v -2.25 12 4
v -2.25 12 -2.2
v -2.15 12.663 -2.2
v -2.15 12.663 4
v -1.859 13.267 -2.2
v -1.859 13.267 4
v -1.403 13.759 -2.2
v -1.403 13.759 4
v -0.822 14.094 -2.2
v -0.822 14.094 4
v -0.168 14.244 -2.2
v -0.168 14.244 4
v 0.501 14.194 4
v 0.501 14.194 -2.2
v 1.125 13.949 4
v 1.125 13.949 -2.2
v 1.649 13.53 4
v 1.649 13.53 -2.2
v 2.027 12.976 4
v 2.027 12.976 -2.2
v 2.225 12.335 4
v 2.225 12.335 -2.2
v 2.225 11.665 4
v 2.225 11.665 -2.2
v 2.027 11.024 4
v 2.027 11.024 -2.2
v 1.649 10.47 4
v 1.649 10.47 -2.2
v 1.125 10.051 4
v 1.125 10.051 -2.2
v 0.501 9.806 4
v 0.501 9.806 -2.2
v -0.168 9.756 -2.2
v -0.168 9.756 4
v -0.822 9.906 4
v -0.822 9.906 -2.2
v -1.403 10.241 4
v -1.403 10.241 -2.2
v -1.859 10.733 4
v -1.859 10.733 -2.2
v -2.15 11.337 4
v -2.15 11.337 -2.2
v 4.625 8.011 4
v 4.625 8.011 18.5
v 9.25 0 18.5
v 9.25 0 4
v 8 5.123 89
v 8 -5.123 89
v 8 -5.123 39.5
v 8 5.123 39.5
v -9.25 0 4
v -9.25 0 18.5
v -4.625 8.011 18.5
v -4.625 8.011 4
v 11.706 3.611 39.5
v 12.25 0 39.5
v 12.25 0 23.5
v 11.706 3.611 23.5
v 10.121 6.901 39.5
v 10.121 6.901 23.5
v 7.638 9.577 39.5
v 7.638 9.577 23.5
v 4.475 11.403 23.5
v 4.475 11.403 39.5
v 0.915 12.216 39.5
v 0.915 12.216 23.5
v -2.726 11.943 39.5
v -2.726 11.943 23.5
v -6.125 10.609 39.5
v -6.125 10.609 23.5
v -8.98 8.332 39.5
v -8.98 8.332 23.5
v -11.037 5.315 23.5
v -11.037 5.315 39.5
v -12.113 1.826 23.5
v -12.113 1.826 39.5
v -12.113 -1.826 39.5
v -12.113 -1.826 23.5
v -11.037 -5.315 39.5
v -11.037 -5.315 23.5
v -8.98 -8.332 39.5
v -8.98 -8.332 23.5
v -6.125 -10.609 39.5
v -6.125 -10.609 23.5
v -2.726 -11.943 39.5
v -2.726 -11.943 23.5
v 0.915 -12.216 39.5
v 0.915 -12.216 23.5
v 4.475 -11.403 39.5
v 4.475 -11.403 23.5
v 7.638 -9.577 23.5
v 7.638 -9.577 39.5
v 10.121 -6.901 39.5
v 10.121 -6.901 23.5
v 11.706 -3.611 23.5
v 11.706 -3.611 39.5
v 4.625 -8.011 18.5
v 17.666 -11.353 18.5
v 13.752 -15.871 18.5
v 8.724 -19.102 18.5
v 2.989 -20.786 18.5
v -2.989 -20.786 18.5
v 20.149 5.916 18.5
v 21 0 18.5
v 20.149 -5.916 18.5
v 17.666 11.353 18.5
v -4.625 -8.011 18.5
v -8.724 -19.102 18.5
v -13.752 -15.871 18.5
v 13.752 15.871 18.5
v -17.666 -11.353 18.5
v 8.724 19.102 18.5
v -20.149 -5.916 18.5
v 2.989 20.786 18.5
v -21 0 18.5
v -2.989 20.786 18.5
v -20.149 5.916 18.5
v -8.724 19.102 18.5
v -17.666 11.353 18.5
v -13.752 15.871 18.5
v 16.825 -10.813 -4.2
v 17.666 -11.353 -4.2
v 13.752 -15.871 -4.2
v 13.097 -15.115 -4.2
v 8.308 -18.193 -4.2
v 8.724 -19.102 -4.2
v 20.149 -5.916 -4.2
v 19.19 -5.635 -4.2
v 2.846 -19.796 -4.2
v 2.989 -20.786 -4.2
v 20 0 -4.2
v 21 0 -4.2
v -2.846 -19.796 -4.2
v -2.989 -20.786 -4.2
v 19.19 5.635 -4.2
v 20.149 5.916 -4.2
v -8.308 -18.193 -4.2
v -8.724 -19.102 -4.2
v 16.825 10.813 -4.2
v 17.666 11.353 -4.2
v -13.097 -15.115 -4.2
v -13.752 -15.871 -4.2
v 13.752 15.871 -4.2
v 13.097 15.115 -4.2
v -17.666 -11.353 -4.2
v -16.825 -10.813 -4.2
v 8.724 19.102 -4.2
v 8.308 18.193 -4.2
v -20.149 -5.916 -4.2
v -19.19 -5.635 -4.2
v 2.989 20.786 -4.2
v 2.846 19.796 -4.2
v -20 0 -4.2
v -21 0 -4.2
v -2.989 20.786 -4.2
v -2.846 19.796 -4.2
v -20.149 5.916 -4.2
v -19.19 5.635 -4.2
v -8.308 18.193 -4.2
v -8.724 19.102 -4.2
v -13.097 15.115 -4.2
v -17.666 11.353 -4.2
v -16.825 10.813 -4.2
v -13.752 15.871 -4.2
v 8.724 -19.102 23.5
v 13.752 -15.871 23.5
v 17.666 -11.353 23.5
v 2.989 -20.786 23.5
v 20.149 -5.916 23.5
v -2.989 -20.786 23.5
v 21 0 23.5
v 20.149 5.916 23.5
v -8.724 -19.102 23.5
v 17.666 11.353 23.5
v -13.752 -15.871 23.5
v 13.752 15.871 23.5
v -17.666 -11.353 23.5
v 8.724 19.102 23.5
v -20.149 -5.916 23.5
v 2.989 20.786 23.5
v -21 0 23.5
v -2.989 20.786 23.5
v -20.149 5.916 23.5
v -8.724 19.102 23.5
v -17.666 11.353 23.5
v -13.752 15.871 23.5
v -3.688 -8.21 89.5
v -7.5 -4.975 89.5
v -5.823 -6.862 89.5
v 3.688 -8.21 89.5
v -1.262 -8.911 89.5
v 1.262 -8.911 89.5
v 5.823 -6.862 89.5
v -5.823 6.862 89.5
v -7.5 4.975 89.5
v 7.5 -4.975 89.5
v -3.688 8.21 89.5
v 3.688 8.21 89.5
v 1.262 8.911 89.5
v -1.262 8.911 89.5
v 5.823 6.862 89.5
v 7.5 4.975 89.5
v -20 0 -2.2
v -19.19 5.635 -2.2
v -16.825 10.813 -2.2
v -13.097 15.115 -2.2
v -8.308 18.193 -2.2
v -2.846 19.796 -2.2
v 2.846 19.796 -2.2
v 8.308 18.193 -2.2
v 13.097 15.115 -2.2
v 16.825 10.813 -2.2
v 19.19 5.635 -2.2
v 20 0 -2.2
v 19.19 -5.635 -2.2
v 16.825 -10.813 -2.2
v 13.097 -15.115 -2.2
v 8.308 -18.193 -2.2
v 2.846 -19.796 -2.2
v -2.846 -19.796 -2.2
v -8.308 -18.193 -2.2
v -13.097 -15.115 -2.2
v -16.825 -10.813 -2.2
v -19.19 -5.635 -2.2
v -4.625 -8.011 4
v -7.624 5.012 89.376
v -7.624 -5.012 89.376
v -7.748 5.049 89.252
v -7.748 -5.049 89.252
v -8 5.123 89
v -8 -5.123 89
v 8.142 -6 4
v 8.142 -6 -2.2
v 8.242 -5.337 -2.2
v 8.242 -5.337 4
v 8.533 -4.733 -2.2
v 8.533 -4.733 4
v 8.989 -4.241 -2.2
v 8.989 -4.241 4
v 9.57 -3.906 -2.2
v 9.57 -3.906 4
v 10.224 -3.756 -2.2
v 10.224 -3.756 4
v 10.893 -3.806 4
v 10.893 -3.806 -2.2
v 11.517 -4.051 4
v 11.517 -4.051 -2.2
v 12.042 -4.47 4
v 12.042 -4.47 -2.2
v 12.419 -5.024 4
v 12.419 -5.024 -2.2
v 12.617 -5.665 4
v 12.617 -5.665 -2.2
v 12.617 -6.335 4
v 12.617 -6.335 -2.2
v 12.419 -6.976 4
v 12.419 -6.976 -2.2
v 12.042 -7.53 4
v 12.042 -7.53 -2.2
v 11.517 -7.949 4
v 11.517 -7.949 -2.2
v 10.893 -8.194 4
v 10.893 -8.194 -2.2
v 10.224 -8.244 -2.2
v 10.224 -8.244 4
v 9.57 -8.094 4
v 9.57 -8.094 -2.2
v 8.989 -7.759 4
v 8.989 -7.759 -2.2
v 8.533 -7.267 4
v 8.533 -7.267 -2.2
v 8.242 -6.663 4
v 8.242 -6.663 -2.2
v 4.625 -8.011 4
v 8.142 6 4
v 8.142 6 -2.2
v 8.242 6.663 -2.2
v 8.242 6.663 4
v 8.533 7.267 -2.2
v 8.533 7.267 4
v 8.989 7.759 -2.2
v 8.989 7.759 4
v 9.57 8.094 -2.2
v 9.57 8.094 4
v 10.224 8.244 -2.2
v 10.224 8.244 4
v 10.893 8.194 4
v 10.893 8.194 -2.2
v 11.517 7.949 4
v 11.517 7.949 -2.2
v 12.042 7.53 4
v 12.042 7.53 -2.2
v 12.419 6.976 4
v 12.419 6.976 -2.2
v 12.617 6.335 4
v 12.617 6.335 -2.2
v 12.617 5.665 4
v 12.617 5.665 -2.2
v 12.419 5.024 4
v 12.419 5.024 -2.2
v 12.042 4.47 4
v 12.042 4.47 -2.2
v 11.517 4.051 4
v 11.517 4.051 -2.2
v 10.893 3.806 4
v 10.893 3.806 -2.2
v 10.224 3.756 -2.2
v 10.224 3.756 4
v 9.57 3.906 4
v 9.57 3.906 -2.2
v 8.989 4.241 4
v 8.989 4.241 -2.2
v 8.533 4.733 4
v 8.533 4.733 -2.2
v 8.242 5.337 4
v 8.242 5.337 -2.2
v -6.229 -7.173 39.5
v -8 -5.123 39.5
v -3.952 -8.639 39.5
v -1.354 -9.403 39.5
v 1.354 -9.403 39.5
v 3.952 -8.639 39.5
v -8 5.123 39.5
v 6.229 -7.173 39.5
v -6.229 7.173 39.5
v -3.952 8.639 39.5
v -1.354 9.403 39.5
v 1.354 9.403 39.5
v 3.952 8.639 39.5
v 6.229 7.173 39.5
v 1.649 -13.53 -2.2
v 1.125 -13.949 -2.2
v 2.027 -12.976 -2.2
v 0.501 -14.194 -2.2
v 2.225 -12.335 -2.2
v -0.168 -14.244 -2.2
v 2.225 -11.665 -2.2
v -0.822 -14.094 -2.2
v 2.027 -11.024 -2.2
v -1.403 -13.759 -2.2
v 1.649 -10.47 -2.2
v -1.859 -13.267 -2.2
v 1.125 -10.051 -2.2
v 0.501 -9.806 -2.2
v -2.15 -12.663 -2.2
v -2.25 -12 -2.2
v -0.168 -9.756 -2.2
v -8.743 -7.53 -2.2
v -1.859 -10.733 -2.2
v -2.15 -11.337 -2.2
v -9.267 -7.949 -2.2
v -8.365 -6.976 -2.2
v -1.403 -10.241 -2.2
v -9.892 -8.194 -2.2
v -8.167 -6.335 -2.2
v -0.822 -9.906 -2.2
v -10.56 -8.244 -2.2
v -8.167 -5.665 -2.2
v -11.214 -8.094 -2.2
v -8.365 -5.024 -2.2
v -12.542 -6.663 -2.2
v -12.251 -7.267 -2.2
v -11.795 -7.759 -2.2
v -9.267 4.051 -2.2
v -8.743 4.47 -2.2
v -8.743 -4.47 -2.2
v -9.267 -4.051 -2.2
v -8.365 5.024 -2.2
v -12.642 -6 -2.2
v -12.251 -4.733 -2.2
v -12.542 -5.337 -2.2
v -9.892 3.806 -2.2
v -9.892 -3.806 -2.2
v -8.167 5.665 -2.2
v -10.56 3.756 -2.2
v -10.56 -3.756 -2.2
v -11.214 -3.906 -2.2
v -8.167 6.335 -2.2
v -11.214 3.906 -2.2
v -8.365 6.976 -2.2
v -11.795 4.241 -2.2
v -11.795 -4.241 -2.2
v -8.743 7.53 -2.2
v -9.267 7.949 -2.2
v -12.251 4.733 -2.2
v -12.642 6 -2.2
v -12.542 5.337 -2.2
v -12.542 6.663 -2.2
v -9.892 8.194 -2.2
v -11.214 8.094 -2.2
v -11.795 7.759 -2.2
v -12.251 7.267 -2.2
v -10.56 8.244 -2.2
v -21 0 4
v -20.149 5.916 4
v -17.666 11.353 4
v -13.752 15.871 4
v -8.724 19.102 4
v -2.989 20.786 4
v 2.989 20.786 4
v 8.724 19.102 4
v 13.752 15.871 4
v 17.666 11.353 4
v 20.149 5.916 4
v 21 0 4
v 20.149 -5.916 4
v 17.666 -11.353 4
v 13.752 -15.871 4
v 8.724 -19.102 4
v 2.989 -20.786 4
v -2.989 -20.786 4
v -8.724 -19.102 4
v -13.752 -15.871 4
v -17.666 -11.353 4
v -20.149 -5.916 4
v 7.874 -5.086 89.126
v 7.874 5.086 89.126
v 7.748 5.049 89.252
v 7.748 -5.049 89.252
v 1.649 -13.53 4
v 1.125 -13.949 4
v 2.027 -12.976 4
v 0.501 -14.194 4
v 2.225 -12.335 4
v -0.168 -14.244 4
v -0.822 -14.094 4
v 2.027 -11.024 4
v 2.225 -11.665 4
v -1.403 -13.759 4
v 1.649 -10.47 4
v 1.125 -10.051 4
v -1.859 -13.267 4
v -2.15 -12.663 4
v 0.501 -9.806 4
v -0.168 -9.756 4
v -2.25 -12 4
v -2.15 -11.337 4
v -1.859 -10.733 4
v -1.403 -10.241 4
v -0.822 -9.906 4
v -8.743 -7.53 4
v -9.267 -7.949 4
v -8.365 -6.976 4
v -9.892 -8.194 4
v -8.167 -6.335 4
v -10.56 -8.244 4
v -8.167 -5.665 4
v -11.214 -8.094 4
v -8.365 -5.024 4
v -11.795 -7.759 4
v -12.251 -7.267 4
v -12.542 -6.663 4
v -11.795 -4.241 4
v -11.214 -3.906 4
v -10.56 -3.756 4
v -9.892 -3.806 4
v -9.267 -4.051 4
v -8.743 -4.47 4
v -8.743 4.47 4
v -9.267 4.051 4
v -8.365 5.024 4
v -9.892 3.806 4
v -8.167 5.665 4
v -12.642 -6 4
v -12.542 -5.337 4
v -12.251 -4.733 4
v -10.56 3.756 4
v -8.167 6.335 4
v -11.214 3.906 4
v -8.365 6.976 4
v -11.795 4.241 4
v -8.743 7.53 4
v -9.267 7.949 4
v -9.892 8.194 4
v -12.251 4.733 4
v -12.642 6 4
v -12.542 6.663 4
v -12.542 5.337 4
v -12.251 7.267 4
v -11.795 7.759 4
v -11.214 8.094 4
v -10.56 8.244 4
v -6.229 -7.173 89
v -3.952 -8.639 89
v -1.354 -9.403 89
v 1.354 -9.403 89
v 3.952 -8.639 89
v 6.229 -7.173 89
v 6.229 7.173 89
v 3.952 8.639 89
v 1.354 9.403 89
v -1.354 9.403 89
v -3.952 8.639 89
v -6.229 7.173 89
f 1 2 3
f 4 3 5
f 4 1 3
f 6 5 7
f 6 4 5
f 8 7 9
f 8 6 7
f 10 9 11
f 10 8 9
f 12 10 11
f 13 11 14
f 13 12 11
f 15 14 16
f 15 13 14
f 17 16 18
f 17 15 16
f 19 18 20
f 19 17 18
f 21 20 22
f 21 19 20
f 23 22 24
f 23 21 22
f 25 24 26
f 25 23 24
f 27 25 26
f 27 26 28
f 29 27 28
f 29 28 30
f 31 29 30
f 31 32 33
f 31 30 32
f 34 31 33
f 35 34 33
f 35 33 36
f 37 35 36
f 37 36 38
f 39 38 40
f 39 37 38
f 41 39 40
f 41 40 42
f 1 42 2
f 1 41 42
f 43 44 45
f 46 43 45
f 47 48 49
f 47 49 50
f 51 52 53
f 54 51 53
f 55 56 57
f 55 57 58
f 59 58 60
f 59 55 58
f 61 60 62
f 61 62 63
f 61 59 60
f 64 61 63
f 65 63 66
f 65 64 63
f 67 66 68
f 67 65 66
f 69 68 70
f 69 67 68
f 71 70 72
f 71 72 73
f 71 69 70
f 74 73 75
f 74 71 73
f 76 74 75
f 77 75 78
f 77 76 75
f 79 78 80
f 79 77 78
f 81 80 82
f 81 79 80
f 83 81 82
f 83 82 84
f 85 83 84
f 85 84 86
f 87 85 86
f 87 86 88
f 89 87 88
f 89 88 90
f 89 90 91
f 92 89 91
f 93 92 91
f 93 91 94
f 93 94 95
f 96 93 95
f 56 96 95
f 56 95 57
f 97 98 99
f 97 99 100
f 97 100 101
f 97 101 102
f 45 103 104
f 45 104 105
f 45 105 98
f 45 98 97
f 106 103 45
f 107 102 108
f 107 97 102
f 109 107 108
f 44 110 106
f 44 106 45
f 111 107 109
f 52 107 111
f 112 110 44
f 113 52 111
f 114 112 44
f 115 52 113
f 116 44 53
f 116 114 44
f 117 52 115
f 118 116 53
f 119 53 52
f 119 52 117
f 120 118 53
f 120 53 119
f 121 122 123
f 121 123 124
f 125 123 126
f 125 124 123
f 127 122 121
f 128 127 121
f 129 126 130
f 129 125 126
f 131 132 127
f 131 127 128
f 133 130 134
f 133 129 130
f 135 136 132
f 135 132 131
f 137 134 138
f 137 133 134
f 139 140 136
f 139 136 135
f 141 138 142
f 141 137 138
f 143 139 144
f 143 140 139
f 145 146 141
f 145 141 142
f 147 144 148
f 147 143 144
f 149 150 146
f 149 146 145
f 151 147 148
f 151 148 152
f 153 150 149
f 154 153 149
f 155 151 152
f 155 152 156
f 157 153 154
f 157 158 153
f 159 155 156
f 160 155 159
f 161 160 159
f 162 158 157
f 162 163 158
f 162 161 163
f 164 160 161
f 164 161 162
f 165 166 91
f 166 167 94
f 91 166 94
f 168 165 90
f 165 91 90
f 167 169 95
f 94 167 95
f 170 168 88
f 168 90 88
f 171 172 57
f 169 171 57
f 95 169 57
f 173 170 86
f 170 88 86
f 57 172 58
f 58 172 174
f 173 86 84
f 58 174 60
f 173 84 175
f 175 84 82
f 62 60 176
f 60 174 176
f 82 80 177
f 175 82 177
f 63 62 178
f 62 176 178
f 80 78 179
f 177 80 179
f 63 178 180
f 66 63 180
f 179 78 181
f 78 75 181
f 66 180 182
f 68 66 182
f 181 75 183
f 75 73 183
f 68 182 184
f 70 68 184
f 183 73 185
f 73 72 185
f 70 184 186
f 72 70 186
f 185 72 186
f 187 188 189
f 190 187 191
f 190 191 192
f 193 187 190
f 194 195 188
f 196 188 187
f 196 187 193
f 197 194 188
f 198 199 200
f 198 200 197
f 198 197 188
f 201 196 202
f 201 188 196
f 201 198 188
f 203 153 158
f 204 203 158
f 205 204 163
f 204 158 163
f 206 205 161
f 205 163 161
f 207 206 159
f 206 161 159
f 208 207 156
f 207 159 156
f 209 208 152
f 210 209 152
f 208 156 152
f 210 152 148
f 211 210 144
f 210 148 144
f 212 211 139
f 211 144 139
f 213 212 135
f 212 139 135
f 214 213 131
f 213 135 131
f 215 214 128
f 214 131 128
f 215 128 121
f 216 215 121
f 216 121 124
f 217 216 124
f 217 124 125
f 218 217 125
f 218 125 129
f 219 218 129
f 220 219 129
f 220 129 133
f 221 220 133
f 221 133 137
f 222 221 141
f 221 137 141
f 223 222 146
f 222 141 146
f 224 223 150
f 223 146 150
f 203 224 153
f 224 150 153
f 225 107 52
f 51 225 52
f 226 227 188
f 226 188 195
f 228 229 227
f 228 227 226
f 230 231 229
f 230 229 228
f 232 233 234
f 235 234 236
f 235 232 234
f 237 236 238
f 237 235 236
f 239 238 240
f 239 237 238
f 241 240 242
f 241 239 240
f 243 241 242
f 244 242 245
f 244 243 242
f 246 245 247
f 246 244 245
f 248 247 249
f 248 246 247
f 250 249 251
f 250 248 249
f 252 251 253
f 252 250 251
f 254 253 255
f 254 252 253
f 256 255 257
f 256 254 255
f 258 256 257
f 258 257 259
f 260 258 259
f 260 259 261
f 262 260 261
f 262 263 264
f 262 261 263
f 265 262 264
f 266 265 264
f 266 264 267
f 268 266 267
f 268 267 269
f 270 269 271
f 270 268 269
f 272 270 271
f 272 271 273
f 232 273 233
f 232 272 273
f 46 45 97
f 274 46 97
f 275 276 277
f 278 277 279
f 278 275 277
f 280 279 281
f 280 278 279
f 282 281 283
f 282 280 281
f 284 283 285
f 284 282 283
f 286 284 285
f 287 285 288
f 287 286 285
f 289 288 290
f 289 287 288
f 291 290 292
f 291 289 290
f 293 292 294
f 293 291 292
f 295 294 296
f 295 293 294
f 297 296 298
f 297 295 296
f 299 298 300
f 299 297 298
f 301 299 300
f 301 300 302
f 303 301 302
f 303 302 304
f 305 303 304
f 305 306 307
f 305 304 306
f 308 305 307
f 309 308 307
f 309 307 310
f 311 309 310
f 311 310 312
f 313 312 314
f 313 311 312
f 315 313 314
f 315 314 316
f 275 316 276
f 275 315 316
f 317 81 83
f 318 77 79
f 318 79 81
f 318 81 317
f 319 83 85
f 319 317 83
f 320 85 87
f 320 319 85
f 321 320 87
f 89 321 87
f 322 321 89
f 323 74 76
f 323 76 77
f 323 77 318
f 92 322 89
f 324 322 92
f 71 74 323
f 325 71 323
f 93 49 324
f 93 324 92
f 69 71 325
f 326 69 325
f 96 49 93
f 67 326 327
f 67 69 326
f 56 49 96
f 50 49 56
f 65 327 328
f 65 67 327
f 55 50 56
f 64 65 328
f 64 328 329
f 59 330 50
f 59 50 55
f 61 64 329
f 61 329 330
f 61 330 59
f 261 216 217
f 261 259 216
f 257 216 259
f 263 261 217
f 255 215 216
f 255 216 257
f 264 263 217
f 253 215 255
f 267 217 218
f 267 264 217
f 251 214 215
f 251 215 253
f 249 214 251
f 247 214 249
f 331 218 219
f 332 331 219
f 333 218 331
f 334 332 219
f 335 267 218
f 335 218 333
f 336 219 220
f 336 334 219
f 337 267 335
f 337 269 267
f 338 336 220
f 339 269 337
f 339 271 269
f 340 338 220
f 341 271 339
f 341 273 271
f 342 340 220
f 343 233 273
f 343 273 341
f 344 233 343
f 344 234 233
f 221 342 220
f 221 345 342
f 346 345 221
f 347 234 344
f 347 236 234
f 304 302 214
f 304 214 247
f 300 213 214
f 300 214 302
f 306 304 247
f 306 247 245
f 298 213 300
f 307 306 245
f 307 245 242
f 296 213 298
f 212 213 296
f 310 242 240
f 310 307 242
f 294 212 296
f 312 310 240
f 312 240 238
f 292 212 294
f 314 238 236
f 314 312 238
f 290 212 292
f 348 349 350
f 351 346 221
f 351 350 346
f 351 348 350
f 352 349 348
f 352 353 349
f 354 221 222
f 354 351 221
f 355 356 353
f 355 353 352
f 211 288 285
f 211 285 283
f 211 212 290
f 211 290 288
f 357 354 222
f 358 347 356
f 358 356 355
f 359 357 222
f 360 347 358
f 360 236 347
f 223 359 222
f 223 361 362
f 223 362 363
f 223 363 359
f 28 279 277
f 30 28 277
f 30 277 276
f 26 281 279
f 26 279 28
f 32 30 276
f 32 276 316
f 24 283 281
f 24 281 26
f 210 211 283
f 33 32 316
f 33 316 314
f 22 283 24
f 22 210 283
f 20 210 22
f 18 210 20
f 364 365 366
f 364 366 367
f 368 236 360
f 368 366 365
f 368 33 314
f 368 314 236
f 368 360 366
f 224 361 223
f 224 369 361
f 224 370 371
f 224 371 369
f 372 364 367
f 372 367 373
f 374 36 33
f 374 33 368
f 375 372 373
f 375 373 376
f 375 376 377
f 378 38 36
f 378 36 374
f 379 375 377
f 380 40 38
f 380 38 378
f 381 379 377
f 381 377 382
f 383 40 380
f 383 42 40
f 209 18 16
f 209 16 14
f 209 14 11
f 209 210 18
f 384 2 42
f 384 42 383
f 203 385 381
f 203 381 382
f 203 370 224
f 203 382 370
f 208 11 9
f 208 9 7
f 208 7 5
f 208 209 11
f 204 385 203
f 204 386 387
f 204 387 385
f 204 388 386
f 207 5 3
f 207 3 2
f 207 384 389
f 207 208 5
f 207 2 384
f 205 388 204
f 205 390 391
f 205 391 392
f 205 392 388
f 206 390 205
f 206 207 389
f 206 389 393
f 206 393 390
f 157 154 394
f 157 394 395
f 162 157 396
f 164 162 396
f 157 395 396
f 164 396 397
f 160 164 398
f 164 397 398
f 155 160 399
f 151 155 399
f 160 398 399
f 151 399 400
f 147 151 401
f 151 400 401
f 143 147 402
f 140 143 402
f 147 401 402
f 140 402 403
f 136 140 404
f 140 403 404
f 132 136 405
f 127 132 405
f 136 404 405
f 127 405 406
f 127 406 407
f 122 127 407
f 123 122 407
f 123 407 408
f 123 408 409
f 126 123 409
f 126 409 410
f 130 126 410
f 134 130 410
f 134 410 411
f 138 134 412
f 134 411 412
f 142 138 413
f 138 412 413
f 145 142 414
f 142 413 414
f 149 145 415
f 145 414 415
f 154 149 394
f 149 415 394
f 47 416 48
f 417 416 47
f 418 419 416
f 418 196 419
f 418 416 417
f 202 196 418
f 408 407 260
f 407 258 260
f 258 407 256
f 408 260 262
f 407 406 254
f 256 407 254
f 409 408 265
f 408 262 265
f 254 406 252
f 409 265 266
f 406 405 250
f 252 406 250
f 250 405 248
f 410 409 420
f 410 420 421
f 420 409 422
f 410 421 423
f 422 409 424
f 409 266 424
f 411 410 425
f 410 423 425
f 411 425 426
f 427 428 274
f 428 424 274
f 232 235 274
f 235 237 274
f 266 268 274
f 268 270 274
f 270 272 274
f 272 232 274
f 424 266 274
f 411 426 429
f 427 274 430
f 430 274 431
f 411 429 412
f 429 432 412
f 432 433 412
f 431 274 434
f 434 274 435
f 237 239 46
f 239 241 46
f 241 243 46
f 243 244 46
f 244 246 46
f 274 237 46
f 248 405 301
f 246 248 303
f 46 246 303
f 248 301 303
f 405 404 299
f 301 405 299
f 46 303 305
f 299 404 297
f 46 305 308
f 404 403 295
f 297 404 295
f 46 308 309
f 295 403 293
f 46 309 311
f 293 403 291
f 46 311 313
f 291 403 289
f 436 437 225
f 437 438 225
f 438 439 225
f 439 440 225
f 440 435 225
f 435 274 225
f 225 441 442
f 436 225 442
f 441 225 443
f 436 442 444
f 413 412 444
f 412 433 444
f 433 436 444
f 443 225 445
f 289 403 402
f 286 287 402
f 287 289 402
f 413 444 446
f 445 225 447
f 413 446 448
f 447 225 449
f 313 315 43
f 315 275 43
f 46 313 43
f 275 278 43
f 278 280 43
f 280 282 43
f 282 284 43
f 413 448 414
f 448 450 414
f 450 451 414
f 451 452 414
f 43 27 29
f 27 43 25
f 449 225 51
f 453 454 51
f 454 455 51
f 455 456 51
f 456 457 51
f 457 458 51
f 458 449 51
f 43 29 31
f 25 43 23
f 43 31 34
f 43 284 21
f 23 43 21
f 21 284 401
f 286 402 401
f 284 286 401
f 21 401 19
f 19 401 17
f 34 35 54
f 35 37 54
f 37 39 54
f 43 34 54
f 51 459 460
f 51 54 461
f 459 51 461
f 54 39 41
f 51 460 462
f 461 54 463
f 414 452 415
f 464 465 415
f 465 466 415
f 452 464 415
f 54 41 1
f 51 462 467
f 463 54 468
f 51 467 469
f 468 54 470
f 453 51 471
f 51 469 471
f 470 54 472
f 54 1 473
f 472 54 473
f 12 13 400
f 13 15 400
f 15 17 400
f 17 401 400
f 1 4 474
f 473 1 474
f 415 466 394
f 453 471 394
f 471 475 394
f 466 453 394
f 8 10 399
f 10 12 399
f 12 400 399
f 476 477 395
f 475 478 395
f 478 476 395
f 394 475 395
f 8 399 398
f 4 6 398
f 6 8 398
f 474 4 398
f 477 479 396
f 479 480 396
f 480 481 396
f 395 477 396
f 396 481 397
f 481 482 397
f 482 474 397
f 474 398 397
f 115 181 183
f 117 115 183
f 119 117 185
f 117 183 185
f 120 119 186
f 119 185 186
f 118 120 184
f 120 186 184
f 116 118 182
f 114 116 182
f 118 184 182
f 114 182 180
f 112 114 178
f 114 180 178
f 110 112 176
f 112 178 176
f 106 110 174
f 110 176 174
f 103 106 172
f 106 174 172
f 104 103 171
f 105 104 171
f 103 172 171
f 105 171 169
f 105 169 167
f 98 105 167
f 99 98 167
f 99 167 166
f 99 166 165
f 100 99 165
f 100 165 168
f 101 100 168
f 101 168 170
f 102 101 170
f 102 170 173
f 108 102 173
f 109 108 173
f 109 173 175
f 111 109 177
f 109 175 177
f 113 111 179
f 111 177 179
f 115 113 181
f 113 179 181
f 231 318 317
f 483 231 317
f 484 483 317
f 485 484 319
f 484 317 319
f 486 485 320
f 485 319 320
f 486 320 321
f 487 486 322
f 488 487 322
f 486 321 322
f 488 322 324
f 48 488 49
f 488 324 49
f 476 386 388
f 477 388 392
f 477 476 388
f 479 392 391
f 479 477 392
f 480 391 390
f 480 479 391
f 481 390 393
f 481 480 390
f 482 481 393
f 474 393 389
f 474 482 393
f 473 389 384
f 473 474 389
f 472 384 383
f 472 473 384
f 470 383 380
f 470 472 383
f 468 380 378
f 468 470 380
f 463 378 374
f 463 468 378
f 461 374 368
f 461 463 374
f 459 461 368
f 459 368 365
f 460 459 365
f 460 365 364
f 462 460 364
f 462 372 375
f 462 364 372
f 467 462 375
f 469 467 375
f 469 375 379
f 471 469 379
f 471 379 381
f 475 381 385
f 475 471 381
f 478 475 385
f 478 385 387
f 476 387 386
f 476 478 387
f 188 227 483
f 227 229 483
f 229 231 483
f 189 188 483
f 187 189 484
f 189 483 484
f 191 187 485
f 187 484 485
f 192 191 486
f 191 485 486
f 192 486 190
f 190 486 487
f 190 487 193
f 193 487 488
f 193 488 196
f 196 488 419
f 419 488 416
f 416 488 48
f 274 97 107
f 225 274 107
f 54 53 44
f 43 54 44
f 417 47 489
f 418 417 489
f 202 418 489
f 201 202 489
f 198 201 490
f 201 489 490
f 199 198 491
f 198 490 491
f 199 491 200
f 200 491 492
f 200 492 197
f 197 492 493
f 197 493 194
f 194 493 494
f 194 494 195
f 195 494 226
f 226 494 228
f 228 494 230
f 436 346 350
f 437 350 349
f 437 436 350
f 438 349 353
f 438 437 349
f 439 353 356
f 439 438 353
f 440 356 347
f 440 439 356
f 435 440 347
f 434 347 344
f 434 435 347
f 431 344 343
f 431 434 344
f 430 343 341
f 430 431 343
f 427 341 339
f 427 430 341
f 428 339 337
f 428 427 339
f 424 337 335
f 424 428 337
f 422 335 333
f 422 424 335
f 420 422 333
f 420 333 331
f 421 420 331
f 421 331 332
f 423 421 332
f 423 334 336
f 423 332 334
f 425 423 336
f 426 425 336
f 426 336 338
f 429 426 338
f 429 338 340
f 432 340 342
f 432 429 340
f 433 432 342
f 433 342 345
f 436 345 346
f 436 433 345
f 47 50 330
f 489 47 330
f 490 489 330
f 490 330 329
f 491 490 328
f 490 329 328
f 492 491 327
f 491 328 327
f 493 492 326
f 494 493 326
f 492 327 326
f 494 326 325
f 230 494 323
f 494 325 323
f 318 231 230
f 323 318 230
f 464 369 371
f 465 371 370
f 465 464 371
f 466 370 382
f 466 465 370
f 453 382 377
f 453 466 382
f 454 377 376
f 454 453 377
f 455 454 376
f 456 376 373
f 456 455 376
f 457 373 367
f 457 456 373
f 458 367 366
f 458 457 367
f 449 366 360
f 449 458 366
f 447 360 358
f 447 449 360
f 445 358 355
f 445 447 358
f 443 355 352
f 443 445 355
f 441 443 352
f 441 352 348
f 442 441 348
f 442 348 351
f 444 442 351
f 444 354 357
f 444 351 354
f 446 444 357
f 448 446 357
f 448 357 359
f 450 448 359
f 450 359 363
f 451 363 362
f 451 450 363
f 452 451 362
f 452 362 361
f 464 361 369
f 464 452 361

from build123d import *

# Parameters (mm, degrees)
SKETCH_1_R            = 9.25
EXTRUDE_1_DEPTH       = 89.5
SKETCH_4_R            = 12.25
EXTRUDE_2_DEPTH       = 16
SKETCH_5_R            = 21
EXTRUDE_3_DEPTH       = 5
EXTRUDE_4_DEPTH       = 4.2
EXTRUDE_4_DEPTH_BACK  = 4
SKETCH_6_R            = 21
SKETCH_6_R_2          = 2.25
SKETCH_7_R            = 20
CUT_EXTRUDE_1_DEPTH   = 2
SKETCH_8_OUTSIDE_W    = 66.188
SKETCH_8_OUTSIDE_H    = 66.188
CUT_EXTRUDE_4_DEPTH   = 14.5
SKETCH_11_R           = 9.5
EXTRUDE_5_DEPTH       = 50
SKETCH_13_W           = 10
SKETCH_13_H           = 10.246950766
CUT_EXTRUDE_1_2_DEPTH = 50
CHAMFER_1_SIZE        = 0.5


with BuildPart() as part:
    # 草图1 → 凸台-拉伸1 (new body)
    with BuildSketch(Plane.XY):
        with Locations(Location((0, 0, 0), (0, 0, 180))):
            Circle(SKETCH_1_R)
    extrude(amount=EXTRUDE_1_DEPTH)

    # 草图4 → 凸台-拉伸2 (add)
    with BuildSketch(Plane.XY.offset(39.5)):
        Circle(SKETCH_4_R)
    extrude(amount=-EXTRUDE_2_DEPTH)

    # 草图5 → 凸台-拉伸3 (add)
    with BuildSketch(Plane(origin=(0, 0, 23.5), x_dir=(-1, 0, 0), z_dir=(0, 0, -1))):
        Circle(SKETCH_5_R)
    extrude(amount=EXTRUDE_3_DEPTH)

    # 草图6 → 凸台-拉伸4 (add, two sides: drawn at the far end of the back side and taken through both)
    with BuildSketch(Plane(origin=(0, 0, 0), x_dir=(-1, 0, 0), z_dir=(0, 0, -1)).offset(-EXTRUDE_4_DEPTH_BACK)):
        Circle(SKETCH_6_R)
        with Locations((0, 12)):
            Circle(SKETCH_6_R_2, mode=Mode.SUBTRACT)
        with Locations((10.392304845, 6)):
            Circle(SKETCH_6_R_2, mode=Mode.SUBTRACT)
        with Locations((10.392304845, -6)):
            Circle(SKETCH_6_R_2, mode=Mode.SUBTRACT)
        with Locations((0, -12)):
            Circle(SKETCH_6_R_2, mode=Mode.SUBTRACT)
        with Locations((-10.392304845, -6)):
            Circle(SKETCH_6_R_2, mode=Mode.SUBTRACT)
        with Locations((-10.392304845, 6)):
            Circle(SKETCH_6_R_2, mode=Mode.SUBTRACT)
    extrude(amount=EXTRUDE_4_DEPTH + EXTRUDE_4_DEPTH_BACK)

    # 草图7 → Cut-Extrude 1 (cut)
    with BuildSketch(Plane(origin=(0, 0, -4.2), x_dir=(-1, 0, 0), z_dir=(0, 0, -1))):
        Circle(SKETCH_7_R)
    extrude(amount=-CUT_EXTRUDE_1_DEPTH, mode=Mode.SUBTRACT)

    # 草图8 outside → 切除-拉伸4 (cut)
    with BuildSketch(Plane(origin=(0, 0, 18.5), x_dir=(-1, 0, 0), z_dir=(0, 0, -1))):
        Rectangle(SKETCH_8_OUTSIDE_W, SKETCH_8_OUTSIDE_H)
        Polygon((-9.25, 0), (-4.625, -8.010734985), (4.625, -8.010734985), (9.25, 0), (4.625, 8.010734985), (-4.625, 8.010734985), align=None, mode=Mode.SUBTRACT)
    extrude(amount=CUT_EXTRUDE_4_DEPTH, mode=Mode.SUBTRACT)

    # 草图11 → 凸台-拉伸5 (add)
    with BuildSketch(Plane.XY.offset(39.5)):
        Circle(SKETCH_11_R)
    extrude(amount=EXTRUDE_5_DEPTH)

    # 草图13 → Cut-Extrude 1 2 (cut)
    with BuildSketch(Plane.XY.offset(89.5)):
        with Locations((-13, 0)):
            Rectangle(SKETCH_13_W, SKETCH_13_H)
        with Locations((13, 0)):
            Rectangle(SKETCH_13_W, SKETCH_13_H)
    extrude(amount=-CUT_EXTRUDE_1_2_DEPTH, mode=Mode.SUBTRACT)

    # 倒角1
    chamfer_1_edges = [part.edges().sort_by_distance(p)[0] for p in [
        (8, 0, 89.5),
        (0, -9.5, 89.5),
        (-8, 0, 89.5),
        (0, 9.5, 89.5),
    ]]
    chamfer(chamfer_1_edges, length=CHAMFER_1_SIZE)


solid = part.part
